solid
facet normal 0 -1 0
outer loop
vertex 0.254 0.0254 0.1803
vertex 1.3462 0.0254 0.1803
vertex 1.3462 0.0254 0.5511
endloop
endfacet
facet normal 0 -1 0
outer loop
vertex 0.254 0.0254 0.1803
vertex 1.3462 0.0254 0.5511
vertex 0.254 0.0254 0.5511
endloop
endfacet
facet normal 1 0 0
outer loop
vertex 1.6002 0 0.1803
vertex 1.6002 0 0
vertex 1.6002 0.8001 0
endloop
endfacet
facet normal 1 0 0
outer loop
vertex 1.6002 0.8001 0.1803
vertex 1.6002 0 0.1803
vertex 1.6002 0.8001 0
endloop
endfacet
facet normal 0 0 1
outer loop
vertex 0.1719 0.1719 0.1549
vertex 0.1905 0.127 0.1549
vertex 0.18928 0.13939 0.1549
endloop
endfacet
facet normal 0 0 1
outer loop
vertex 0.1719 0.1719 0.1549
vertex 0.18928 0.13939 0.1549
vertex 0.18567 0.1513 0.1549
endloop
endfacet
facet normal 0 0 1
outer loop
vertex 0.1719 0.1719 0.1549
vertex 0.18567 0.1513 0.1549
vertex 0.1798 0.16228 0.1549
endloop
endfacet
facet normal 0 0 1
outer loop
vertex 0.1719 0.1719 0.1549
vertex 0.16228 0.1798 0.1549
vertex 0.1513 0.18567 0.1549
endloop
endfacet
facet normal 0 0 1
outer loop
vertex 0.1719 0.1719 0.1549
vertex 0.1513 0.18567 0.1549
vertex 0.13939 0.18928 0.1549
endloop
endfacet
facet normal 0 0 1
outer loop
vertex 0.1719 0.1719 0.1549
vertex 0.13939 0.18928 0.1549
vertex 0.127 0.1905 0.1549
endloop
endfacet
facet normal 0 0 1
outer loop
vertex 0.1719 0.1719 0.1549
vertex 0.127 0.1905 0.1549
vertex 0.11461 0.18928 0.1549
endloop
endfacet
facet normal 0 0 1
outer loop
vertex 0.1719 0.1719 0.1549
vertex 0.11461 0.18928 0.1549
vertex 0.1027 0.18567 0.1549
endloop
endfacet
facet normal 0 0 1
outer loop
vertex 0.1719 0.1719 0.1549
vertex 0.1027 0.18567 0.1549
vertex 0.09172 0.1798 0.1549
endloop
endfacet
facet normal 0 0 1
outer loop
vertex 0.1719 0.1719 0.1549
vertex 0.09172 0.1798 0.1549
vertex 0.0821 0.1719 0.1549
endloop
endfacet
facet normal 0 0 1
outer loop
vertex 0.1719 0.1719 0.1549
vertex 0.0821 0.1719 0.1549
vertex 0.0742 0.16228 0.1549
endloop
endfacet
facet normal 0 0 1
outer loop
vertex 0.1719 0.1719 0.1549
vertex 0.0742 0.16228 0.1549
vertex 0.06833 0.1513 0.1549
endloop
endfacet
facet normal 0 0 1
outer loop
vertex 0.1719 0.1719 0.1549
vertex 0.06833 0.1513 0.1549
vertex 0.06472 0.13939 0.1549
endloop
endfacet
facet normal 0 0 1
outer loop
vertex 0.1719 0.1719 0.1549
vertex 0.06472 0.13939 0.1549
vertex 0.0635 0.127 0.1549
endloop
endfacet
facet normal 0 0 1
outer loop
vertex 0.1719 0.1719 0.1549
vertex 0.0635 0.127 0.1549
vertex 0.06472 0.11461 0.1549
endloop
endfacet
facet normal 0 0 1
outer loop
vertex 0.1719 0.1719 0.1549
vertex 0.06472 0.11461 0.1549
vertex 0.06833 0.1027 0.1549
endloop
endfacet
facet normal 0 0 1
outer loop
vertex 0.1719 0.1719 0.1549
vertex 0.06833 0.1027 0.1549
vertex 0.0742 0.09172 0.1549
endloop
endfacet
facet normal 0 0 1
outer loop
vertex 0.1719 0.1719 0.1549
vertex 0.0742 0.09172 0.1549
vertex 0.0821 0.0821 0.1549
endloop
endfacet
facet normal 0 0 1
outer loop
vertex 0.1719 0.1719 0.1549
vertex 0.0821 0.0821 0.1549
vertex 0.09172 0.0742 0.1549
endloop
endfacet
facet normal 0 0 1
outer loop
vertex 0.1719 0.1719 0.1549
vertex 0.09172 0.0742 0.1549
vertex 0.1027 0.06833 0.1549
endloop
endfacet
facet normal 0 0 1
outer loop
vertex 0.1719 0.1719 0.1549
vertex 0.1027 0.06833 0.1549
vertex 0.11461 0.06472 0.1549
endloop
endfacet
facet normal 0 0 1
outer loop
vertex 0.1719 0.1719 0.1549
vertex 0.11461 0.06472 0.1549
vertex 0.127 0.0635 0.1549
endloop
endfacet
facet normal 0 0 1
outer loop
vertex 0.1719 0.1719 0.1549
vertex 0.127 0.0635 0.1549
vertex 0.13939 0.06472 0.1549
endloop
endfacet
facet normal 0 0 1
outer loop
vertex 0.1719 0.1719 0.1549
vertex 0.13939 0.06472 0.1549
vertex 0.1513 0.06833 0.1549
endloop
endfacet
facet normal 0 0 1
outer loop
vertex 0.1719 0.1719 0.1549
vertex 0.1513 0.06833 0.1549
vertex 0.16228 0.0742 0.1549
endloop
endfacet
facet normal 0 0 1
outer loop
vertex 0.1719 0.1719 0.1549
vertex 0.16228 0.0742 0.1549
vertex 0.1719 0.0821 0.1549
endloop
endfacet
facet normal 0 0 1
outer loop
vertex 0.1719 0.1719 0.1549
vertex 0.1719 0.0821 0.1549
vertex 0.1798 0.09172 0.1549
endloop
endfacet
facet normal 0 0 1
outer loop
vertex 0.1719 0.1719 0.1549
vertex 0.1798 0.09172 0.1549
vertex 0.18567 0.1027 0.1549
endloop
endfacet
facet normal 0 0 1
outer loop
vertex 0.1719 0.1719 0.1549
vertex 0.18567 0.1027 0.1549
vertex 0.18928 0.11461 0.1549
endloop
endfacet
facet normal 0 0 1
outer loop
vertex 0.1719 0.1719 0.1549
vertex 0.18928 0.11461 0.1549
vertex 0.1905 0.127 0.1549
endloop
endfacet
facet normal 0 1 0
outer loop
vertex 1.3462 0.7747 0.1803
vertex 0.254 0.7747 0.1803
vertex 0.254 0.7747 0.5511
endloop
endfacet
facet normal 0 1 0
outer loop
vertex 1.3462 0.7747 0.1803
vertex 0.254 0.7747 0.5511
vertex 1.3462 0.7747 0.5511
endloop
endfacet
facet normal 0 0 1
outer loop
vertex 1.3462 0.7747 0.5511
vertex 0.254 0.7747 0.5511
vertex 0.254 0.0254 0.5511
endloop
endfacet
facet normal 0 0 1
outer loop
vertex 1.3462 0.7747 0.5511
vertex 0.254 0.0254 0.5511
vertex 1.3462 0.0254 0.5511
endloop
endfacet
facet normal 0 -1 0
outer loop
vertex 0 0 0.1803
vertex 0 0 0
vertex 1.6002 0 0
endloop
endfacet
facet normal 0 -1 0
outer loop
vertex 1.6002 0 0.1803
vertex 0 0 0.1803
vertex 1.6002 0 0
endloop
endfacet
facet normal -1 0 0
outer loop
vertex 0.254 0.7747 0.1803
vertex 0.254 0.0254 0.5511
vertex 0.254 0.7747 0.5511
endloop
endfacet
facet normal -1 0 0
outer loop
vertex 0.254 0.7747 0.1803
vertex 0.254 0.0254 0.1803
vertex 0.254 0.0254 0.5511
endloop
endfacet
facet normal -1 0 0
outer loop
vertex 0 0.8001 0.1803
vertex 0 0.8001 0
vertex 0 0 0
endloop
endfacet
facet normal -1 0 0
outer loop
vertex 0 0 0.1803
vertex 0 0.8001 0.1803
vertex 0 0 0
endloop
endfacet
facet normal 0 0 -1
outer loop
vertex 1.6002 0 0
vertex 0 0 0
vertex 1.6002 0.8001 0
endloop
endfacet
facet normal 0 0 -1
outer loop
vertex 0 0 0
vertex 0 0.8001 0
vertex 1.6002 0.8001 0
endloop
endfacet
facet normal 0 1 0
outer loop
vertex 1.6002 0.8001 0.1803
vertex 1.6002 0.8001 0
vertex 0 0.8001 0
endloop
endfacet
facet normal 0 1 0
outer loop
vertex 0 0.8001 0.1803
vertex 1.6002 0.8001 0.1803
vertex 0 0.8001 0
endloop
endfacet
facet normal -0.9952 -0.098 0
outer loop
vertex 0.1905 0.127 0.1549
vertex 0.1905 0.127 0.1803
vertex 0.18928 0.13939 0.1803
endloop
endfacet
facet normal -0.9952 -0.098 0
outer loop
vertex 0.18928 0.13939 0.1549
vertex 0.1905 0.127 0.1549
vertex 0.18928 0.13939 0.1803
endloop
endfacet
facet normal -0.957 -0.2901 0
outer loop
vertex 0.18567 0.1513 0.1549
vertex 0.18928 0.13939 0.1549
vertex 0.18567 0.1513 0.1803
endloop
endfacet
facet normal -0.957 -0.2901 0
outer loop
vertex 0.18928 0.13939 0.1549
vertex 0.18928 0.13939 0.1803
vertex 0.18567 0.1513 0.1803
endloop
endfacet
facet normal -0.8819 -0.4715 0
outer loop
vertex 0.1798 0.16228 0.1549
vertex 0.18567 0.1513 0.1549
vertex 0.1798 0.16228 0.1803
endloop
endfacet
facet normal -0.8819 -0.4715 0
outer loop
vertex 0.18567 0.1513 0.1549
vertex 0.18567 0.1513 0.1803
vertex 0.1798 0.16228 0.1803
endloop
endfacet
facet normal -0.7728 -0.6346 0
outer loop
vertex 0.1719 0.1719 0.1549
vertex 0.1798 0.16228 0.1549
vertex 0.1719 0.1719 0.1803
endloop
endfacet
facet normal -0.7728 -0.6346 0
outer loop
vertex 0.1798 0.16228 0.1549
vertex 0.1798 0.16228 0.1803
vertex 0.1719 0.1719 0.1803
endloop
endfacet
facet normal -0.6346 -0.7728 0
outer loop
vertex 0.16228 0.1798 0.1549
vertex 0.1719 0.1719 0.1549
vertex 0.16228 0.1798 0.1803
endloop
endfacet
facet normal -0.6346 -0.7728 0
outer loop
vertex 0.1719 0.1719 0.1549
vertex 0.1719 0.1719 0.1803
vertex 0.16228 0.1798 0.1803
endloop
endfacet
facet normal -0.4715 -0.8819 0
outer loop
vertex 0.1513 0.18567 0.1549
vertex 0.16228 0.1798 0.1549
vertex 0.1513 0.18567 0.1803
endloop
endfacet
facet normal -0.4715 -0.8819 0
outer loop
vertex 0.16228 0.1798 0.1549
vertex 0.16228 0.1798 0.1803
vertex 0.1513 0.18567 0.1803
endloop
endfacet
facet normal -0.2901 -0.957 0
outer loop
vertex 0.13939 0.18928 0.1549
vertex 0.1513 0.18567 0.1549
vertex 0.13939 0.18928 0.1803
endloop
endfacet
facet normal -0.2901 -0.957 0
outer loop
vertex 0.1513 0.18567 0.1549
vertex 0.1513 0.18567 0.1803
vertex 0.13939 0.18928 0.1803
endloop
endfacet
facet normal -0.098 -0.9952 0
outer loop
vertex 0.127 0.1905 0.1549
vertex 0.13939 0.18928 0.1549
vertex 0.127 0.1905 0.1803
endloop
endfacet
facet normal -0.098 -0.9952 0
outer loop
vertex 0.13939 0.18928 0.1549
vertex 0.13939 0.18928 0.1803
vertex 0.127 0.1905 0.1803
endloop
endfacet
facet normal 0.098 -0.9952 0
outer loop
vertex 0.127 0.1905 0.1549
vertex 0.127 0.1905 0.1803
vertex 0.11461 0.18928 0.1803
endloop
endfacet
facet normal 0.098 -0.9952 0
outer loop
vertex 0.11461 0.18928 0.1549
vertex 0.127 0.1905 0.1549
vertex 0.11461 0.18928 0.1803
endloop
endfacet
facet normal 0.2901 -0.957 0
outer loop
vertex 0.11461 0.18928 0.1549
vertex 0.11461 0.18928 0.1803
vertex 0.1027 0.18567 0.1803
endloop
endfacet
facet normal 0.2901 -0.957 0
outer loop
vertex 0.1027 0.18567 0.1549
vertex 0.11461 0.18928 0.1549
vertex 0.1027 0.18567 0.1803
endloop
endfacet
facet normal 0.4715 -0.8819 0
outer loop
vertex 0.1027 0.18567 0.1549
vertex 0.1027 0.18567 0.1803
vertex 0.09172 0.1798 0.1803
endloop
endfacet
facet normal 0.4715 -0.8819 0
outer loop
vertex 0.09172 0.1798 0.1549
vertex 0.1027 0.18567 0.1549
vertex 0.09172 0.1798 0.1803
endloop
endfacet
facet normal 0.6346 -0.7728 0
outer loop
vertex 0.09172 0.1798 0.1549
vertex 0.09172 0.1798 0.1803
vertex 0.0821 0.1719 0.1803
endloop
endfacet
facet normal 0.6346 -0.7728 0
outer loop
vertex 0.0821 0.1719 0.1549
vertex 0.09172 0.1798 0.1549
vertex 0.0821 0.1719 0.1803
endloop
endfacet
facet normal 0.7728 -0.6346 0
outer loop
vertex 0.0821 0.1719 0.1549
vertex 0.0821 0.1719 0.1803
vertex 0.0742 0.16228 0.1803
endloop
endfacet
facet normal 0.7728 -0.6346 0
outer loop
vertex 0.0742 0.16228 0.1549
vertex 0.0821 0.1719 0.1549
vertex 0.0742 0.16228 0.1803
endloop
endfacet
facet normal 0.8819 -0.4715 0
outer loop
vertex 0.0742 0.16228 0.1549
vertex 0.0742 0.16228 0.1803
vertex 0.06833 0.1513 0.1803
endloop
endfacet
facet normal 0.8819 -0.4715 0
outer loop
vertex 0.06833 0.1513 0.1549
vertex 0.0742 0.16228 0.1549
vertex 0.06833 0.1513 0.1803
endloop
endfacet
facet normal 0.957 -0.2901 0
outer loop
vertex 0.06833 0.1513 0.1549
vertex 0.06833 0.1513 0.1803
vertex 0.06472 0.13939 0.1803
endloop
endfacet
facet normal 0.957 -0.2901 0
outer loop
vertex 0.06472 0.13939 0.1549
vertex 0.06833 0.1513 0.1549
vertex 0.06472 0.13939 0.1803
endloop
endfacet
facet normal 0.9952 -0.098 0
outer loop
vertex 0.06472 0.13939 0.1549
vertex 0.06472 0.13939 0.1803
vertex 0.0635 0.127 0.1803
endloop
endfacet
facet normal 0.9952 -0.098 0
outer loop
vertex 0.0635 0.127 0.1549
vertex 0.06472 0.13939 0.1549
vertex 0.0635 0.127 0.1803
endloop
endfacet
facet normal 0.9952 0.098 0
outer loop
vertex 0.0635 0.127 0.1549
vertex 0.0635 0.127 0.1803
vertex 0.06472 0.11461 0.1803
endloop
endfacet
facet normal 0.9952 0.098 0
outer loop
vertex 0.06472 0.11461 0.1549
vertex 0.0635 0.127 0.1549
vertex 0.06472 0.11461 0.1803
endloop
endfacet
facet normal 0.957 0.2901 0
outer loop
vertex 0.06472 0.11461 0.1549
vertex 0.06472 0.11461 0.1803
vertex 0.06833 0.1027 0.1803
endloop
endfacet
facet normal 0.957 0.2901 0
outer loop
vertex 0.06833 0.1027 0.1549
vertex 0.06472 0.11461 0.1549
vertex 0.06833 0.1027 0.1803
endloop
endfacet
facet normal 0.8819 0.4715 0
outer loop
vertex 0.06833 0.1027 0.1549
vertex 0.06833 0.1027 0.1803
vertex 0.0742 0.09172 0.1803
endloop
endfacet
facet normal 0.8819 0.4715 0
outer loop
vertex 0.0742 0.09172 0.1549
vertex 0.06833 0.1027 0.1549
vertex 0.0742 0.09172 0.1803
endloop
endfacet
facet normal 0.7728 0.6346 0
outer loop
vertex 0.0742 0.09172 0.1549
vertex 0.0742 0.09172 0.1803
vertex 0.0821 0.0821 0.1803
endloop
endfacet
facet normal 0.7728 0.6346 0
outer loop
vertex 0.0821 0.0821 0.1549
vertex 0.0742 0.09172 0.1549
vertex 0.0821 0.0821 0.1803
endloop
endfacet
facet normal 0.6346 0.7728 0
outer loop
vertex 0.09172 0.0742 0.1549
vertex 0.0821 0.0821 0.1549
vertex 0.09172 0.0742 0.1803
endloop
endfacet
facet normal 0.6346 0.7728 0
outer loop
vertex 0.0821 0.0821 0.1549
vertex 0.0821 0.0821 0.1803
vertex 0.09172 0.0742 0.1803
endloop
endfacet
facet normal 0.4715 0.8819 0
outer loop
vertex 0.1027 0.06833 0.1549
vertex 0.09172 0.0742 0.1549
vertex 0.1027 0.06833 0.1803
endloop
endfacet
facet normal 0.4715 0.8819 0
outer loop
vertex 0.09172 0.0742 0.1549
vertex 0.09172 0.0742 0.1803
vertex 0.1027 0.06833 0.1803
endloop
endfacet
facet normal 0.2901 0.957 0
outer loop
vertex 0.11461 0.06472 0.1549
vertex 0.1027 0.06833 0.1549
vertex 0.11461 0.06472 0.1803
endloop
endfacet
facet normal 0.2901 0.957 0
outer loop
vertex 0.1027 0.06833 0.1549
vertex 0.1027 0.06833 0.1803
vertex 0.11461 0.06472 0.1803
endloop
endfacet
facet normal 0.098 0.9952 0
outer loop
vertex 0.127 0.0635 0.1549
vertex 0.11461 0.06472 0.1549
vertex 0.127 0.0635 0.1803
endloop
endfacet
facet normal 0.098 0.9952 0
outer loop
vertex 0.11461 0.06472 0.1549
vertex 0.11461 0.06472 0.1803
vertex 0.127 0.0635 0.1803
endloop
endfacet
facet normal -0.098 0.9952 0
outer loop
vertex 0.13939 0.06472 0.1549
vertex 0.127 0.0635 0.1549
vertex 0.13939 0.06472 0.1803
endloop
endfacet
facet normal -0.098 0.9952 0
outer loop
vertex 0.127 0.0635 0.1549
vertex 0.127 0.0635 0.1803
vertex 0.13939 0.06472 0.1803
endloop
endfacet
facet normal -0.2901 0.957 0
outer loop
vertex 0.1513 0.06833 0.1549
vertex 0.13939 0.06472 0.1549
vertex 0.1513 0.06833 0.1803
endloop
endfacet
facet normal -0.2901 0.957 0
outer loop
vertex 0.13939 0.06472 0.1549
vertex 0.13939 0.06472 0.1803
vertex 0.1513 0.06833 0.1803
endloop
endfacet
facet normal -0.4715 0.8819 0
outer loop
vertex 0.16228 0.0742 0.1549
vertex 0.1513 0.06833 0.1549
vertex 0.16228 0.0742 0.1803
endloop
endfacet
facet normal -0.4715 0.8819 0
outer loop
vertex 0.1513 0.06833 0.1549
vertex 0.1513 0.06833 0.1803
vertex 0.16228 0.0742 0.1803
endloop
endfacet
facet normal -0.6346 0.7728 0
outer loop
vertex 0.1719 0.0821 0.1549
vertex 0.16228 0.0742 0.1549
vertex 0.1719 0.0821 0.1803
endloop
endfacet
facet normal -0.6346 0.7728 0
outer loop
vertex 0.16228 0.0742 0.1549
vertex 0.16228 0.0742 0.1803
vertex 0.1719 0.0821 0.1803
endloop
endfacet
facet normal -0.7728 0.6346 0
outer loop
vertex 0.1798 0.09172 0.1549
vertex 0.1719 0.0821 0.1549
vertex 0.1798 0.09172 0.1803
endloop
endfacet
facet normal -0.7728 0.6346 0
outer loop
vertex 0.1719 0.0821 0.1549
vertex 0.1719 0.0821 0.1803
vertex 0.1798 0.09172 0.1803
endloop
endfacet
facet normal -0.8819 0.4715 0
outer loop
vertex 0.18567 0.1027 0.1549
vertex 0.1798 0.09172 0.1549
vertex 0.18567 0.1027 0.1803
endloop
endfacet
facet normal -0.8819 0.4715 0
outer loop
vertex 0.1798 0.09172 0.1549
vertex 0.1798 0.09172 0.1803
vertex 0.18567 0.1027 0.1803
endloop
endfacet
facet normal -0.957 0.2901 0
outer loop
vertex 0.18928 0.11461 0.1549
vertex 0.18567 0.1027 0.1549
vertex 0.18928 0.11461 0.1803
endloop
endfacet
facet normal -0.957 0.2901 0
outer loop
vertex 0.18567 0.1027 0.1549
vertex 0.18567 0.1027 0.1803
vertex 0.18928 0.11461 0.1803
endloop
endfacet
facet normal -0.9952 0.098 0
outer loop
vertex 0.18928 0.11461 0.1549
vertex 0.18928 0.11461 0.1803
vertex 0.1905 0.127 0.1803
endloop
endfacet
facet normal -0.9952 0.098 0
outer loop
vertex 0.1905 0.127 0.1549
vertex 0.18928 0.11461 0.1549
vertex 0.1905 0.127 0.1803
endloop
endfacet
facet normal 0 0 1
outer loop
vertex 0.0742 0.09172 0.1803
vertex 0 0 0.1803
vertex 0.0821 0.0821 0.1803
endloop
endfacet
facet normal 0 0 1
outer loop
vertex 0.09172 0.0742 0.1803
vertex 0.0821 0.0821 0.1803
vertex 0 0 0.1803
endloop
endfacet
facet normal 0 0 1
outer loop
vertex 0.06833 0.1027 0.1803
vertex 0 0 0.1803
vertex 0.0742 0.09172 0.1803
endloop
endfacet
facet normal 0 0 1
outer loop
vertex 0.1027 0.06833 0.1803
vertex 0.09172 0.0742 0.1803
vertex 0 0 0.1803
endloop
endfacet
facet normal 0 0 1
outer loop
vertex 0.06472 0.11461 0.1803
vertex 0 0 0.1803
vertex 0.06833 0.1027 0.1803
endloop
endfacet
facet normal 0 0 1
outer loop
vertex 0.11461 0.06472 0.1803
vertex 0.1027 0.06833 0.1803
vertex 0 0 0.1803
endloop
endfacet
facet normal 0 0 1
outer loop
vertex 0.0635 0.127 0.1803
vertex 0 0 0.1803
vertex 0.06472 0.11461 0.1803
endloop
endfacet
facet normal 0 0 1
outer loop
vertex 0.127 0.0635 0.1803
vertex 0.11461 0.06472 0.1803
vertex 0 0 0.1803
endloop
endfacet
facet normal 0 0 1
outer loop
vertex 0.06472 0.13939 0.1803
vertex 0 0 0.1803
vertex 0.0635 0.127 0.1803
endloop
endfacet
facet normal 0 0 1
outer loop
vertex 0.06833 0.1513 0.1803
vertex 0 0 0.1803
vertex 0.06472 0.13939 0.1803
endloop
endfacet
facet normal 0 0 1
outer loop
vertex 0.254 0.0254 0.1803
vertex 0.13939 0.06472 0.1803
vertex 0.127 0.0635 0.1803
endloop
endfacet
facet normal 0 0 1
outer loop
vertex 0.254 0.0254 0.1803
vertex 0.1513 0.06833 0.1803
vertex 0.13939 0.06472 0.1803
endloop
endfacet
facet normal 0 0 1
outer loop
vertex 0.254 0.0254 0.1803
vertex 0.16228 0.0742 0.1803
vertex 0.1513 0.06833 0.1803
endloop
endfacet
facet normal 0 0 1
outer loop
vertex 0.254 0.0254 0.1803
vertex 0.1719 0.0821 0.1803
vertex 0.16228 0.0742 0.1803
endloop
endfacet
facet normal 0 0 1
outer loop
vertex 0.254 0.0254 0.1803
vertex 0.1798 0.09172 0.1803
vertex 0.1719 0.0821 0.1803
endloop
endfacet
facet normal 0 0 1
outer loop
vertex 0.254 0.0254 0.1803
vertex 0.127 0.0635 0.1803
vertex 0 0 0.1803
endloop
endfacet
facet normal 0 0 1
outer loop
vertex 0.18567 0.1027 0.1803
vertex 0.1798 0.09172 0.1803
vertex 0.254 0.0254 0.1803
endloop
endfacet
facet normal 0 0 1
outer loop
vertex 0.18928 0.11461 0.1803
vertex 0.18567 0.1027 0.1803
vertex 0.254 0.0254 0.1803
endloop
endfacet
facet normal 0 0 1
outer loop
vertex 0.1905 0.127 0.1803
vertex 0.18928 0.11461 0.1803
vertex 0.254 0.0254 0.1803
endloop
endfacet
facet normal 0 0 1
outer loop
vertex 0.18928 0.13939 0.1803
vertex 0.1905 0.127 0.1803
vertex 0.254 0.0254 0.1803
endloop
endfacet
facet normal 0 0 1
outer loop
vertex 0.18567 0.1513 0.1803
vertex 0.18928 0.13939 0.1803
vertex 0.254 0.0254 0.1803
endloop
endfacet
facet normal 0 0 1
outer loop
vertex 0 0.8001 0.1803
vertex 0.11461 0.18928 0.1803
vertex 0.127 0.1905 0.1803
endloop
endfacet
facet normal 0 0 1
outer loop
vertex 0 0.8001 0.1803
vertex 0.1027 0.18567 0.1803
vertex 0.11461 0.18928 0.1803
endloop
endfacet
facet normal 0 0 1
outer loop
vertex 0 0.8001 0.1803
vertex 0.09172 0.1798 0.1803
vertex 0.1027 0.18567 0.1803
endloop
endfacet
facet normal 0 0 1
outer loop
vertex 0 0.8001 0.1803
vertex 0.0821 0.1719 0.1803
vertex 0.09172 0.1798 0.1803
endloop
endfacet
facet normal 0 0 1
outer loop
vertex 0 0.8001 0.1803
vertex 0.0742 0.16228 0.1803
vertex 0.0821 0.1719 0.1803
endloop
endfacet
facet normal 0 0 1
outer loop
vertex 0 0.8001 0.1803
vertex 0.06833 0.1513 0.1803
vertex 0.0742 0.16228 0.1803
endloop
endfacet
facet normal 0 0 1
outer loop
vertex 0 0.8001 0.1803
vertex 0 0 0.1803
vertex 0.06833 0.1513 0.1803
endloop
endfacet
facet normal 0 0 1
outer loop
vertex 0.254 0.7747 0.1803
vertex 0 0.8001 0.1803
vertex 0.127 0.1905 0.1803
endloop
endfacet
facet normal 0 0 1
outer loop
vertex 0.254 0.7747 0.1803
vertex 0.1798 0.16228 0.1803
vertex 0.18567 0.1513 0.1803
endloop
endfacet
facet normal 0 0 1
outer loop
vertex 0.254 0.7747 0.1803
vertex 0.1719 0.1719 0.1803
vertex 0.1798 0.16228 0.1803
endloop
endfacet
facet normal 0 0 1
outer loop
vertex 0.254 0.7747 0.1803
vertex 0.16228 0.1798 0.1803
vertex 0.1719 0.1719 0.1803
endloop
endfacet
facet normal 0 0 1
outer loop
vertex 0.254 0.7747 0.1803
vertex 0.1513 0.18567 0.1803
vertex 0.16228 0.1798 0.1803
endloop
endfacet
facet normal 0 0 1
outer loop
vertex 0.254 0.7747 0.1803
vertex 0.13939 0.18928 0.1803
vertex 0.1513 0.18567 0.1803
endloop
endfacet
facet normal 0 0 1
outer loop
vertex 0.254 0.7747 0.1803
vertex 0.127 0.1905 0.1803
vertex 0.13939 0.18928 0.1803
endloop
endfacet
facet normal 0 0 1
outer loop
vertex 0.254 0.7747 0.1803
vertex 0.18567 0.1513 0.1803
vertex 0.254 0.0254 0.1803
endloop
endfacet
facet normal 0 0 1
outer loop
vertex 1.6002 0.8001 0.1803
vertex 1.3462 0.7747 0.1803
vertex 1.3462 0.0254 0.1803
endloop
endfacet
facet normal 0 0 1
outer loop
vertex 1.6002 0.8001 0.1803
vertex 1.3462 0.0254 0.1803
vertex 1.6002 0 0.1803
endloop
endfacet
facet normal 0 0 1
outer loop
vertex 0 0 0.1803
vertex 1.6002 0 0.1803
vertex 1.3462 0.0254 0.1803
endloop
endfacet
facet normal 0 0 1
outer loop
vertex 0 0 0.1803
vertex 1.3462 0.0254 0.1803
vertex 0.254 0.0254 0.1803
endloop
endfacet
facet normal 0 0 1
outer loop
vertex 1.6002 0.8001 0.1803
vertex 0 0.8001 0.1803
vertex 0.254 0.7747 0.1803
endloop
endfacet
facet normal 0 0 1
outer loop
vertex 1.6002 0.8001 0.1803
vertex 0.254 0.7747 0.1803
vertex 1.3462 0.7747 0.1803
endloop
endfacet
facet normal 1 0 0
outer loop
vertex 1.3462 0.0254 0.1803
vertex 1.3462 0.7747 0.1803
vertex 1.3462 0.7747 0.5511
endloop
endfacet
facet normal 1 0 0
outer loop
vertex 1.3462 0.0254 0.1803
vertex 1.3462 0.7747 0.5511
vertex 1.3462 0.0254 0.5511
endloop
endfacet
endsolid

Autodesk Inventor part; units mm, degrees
ref_plane "YZ Plane" through (0, 0, 0) normal (1, 0, 0) x (0, 1, 0)
ref_plane "XZ Plane" through (0, 0, 0) normal (0, 1, 0) x (-1, 0, 0)
ref_plane "XY Plane" through (0, 0, 0) normal (0, 0, 1) x (1, 0, 0)
sketch "Sketch1" plane through (0, 0, 0) normal (0, 0, 1) x (1, 0, 0)
  line L0 (0, 0) -> (1.6002, 0)
  line L1 (1.6002, 0) -> (1.6002, 0.8001)
  line L2 (1.6002, 0.8001) -> (0, 0.8001)
  line L3 (0, 0.8001) -> (0, 0)
  dimension "d0" = 1.6002
  dimension "d1" = 0.8001
extrude "Extrusion1" add sketch "Sketch1" along normal blind 0.1803
sketch "Sketch2" plane through (0, 0, 0.1803) normal (0, 0, 1) x (1, 0, 0)
  line L0 (0.254, 0.7747) -> (1.3462, 0.7747)
  line L1 (1.3462, 0.7747) -> (1.3462, 0.0254)
  line L2 (1.3462, 0.0254) -> (0.254, 0.0254)
  line L3 (0.254, 0.0254) -> (0.254, 0.7747)
  line L4 (1.6002, 0.8001) -> (0, 0.8001) projected
  line L5 (0, 0) -> (1.6002, 0) projected
  line L6 (1.6002, 0) -> (1.6002, 0.8001) projected
  line L7 (0, 0.8001) -> (0, 0) projected
  dimension "d4" = 0.0254
  dimension "d5" = 0.0254
  dimension "d6" = 0.254
  dimension "d7" = 0.254
extrude "Extrusion2" add sketch "Sketch2" along normal blind 0.3708 contours L0 L1 L2 L3
sketch "Sketch3" plane through (0, 0, 0.1803) normal (0, 0, 1) x (1, 0, 0)
  circle A0 centre (0.127, 0.127) radius 0.0635
  line L0 (0, 0) -> (1.6002, 0) projected
  line L1 (0, 0.8001) -> (0, 0) projected
  dimension "d10" = 0.127
  dimension "d11" = 0.127
  dimension "d12" = 0.127
extrude "Extrusion3" cut sketch "Sketch3" against normal blind 0.0254
properties part number "sLarge LED"
